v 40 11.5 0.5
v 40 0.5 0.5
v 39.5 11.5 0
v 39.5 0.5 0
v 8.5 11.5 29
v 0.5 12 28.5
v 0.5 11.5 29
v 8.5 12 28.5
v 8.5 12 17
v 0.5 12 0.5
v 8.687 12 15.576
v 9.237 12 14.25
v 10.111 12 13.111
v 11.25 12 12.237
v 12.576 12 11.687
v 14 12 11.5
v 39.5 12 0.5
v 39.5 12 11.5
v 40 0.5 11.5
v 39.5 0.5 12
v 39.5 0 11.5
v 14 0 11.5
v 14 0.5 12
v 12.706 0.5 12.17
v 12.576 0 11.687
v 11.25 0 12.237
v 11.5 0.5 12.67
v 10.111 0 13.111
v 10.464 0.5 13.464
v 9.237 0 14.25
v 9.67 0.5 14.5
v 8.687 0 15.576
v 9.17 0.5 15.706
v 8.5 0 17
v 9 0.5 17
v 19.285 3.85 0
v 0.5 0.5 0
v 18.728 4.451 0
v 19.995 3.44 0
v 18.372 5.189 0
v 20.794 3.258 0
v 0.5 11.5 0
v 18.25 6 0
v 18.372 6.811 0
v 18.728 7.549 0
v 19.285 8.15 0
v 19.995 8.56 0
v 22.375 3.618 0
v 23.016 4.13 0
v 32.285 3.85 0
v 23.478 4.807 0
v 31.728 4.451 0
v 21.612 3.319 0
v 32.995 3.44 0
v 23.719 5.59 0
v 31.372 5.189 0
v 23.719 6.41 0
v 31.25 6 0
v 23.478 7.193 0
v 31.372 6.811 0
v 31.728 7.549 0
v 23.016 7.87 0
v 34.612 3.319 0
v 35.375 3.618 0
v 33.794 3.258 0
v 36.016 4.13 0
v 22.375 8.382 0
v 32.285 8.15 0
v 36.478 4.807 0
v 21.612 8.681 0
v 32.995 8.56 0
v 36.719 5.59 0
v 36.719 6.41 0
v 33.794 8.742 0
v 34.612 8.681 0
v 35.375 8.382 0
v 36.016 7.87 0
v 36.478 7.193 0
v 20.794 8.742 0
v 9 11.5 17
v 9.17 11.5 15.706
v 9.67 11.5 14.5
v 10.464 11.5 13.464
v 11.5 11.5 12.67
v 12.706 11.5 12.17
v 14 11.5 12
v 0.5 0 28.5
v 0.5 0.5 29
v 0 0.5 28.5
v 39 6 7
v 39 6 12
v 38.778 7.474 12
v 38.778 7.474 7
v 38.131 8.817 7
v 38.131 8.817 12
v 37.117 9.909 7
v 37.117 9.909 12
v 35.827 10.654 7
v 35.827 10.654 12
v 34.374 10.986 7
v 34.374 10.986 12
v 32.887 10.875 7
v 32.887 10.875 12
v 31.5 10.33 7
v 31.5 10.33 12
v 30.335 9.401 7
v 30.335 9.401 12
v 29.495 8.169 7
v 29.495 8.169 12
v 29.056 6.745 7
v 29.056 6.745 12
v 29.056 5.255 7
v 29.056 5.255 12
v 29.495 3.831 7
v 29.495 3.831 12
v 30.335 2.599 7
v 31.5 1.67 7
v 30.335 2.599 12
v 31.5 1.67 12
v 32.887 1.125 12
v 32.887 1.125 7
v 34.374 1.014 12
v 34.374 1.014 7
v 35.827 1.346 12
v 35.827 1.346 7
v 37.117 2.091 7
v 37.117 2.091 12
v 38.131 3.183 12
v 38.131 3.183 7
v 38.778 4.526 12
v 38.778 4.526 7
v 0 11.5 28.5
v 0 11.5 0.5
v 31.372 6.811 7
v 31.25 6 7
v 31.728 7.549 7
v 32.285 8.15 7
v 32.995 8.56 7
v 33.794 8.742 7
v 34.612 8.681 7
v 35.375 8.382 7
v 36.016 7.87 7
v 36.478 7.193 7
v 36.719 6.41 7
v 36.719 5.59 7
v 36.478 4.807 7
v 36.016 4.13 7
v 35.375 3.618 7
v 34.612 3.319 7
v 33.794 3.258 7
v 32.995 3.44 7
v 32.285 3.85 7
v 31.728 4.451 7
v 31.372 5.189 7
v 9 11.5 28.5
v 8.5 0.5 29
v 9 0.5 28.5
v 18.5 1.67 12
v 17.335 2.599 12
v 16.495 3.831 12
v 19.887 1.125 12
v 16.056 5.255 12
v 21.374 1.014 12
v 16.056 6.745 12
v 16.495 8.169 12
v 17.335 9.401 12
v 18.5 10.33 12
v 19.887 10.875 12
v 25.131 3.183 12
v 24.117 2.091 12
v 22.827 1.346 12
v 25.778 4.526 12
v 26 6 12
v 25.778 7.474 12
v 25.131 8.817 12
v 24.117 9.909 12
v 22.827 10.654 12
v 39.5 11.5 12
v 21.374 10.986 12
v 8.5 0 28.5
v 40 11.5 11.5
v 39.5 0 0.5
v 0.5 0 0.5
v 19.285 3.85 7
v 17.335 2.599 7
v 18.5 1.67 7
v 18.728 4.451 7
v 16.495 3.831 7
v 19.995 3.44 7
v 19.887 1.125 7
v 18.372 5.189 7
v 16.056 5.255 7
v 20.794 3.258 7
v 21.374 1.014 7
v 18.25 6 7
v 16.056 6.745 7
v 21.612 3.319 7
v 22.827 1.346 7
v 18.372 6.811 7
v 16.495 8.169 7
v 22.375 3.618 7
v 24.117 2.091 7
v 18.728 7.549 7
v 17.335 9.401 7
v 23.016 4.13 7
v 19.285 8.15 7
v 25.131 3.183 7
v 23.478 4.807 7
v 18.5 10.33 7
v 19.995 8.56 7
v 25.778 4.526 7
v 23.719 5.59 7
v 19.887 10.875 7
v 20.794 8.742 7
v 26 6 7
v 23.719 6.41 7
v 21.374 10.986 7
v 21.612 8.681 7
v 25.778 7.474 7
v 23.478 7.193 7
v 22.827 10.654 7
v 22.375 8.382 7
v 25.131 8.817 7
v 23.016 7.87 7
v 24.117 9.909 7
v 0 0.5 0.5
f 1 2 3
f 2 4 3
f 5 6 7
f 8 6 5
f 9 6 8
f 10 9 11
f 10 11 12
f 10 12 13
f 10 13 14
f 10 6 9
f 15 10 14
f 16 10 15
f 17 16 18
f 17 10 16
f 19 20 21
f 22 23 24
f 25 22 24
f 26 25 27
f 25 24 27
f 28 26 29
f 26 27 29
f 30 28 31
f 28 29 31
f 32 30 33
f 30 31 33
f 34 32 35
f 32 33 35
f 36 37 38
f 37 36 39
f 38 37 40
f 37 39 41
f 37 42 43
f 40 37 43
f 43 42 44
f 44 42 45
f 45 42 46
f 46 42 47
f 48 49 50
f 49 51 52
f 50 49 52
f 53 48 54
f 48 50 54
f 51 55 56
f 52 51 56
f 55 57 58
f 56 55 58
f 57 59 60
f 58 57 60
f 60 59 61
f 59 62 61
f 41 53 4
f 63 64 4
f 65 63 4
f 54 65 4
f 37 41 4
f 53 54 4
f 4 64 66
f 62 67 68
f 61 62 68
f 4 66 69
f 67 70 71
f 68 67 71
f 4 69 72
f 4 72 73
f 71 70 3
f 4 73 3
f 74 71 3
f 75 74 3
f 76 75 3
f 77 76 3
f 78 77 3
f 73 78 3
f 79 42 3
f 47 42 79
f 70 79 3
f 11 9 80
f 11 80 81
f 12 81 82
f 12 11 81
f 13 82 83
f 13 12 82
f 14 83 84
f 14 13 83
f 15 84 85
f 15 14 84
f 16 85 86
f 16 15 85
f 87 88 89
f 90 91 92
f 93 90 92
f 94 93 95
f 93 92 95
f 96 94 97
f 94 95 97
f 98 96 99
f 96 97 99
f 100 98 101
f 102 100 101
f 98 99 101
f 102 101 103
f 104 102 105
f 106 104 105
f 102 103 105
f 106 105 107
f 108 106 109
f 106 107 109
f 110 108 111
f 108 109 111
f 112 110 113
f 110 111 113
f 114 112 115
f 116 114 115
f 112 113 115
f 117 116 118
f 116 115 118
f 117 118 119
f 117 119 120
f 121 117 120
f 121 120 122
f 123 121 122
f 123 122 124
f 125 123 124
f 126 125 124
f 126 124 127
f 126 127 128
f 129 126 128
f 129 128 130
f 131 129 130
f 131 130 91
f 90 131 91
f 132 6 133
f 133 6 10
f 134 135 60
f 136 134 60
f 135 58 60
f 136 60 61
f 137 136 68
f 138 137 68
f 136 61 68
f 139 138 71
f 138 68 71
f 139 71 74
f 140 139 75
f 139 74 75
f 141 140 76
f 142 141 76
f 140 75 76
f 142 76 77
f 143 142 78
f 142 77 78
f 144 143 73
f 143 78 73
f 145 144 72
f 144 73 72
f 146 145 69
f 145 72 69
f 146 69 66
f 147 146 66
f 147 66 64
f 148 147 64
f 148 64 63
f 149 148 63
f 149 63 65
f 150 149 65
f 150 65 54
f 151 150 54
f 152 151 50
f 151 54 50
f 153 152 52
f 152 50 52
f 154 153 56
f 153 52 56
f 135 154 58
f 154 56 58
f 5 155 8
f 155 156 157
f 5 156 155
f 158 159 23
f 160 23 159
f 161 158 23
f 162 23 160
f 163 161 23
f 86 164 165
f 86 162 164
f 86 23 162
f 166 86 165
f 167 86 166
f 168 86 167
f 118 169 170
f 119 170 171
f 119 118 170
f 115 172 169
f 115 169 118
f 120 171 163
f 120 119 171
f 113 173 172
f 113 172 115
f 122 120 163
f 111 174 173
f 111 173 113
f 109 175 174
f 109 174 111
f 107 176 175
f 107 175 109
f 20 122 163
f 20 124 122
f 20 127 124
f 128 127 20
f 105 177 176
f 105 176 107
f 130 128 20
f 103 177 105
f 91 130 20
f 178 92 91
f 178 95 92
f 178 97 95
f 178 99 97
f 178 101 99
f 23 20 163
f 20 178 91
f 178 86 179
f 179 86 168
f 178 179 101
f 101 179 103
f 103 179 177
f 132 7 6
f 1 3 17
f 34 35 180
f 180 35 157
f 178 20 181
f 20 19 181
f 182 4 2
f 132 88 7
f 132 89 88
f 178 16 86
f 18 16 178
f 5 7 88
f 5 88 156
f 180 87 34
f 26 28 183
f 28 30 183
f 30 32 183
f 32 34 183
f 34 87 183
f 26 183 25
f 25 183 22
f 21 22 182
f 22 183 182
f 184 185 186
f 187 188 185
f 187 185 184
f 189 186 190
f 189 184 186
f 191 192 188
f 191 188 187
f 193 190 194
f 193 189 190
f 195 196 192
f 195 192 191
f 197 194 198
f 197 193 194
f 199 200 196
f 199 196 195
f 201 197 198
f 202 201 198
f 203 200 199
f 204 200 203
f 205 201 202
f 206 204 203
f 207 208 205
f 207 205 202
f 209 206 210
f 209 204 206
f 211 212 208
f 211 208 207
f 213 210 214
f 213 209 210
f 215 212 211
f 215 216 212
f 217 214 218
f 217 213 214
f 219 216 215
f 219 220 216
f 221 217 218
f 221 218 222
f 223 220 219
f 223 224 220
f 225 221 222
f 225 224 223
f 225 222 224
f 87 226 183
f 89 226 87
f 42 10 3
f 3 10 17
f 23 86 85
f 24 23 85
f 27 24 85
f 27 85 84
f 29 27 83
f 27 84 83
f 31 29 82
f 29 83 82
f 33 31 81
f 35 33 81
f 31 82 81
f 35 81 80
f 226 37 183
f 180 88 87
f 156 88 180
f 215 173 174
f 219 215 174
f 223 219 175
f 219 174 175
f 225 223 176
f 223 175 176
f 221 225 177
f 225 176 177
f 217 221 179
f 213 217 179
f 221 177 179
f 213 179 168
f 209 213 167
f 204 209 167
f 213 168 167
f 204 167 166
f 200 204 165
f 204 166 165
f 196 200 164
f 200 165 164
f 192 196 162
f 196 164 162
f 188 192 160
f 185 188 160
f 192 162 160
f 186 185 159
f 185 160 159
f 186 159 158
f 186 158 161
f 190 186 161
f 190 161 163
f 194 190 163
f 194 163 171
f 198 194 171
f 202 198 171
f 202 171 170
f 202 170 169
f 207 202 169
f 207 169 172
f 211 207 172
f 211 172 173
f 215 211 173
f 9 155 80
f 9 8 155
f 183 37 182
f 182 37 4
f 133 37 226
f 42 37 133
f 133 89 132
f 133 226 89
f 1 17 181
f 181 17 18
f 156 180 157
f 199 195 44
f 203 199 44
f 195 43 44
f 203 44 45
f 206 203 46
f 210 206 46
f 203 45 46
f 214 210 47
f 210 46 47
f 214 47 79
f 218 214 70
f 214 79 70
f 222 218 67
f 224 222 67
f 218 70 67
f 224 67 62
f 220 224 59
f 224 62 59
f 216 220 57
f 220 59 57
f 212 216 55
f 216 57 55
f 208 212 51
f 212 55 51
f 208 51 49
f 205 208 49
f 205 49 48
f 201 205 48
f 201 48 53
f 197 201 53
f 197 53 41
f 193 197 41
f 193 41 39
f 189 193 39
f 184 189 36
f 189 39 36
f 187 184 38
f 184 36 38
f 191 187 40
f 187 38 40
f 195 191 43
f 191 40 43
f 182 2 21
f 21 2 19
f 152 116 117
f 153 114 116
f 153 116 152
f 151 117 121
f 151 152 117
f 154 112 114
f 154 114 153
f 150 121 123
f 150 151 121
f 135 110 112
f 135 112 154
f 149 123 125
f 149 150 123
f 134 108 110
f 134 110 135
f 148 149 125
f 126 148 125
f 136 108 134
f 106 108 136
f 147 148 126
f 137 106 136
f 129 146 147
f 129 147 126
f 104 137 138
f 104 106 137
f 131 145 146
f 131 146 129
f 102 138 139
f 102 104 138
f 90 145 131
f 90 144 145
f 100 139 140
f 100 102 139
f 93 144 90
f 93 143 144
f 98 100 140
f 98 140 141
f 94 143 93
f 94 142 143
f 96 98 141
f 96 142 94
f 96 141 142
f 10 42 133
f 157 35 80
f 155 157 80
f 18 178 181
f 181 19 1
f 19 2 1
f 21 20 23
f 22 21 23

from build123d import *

# Parameters (mm, degrees)
SKETCH_1_W                   = 40
SKETCH_1_H                   = 12
EXTRUDE_1_DEPTH              = 12
SKETCH_2_W                   = 9
SKETCH_2_H                   = 12
EXTRUDE_2_DEPTH              = 17
FILLET_1_R                   = 5
HOLE_WIZARD_M5_1_D           = 5.5
HOLE_WIZARD_M5_1_CBORE_D     = 10
HOLE_WIZARD_M5_1_CBORE_DEPTH = 5
CHAMFER_1_SIZE               = 0.5


with BuildPart() as part:
    # 草图1 → 凸台-拉伸1 (new body)
    with BuildSketch(Plane.XY):
        with Locations((20, 6)):
            Rectangle(SKETCH_1_W, SKETCH_1_H)
    extrude(amount=EXTRUDE_1_DEPTH)

    # 草图2 → 凸台-拉伸2 (add)
    with BuildSketch(Plane.XY.offset(12)):
        with Locations((4.5, 6)):
            Rectangle(SKETCH_2_W, SKETCH_2_H)
    extrude(amount=EXTRUDE_2_DEPTH)

    # 圆角1
    fillet_1_edges = [part.edges().sort_by_distance(p)[0] for p in [
        (9, 6, 12),
    ]]
    fillet(fillet_1_edges, radius=FILLET_1_R)

    # M5 六角凹头螺钉的柱形沉头孔1 (through all)
    with Locations(Plane.XY.offset(12)):
        with Locations((34, 6), (21, 6)):
            CounterBoreHole(HOLE_WIZARD_M5_1_D / 2, HOLE_WIZARD_M5_1_CBORE_D / 2, HOLE_WIZARD_M5_1_CBORE_DEPTH)

    # 倒角1
    chamfer_1_edges = [part.edges().sort_by_distance(p)[0] for p in [
        (40, 6, 12),
        (27, 12, 12),
        (9, 0, 23),
        (9, 12, 23),
        (0, 6, 29),
        (4.5, 0, 29),
        (9, 6, 29),
        (4.5, 12, 29),
        (27, 0, 12),
        (10.464466094, 12, 13.464466094),
        (10.464466094, 0, 13.464466094),
        (20, 12, 0),
        (40, 6, 0),
        (20, 0, 0),
        (0, 6, 0),
        (0, 12, 14.5),
        (40, 12, 6),
        (40, 0, 6),
        (0, 0, 14.5),
    ]]
    chamfer(chamfer_1_edges, length=CHAMFER_1_SIZE)


solid = part.part
